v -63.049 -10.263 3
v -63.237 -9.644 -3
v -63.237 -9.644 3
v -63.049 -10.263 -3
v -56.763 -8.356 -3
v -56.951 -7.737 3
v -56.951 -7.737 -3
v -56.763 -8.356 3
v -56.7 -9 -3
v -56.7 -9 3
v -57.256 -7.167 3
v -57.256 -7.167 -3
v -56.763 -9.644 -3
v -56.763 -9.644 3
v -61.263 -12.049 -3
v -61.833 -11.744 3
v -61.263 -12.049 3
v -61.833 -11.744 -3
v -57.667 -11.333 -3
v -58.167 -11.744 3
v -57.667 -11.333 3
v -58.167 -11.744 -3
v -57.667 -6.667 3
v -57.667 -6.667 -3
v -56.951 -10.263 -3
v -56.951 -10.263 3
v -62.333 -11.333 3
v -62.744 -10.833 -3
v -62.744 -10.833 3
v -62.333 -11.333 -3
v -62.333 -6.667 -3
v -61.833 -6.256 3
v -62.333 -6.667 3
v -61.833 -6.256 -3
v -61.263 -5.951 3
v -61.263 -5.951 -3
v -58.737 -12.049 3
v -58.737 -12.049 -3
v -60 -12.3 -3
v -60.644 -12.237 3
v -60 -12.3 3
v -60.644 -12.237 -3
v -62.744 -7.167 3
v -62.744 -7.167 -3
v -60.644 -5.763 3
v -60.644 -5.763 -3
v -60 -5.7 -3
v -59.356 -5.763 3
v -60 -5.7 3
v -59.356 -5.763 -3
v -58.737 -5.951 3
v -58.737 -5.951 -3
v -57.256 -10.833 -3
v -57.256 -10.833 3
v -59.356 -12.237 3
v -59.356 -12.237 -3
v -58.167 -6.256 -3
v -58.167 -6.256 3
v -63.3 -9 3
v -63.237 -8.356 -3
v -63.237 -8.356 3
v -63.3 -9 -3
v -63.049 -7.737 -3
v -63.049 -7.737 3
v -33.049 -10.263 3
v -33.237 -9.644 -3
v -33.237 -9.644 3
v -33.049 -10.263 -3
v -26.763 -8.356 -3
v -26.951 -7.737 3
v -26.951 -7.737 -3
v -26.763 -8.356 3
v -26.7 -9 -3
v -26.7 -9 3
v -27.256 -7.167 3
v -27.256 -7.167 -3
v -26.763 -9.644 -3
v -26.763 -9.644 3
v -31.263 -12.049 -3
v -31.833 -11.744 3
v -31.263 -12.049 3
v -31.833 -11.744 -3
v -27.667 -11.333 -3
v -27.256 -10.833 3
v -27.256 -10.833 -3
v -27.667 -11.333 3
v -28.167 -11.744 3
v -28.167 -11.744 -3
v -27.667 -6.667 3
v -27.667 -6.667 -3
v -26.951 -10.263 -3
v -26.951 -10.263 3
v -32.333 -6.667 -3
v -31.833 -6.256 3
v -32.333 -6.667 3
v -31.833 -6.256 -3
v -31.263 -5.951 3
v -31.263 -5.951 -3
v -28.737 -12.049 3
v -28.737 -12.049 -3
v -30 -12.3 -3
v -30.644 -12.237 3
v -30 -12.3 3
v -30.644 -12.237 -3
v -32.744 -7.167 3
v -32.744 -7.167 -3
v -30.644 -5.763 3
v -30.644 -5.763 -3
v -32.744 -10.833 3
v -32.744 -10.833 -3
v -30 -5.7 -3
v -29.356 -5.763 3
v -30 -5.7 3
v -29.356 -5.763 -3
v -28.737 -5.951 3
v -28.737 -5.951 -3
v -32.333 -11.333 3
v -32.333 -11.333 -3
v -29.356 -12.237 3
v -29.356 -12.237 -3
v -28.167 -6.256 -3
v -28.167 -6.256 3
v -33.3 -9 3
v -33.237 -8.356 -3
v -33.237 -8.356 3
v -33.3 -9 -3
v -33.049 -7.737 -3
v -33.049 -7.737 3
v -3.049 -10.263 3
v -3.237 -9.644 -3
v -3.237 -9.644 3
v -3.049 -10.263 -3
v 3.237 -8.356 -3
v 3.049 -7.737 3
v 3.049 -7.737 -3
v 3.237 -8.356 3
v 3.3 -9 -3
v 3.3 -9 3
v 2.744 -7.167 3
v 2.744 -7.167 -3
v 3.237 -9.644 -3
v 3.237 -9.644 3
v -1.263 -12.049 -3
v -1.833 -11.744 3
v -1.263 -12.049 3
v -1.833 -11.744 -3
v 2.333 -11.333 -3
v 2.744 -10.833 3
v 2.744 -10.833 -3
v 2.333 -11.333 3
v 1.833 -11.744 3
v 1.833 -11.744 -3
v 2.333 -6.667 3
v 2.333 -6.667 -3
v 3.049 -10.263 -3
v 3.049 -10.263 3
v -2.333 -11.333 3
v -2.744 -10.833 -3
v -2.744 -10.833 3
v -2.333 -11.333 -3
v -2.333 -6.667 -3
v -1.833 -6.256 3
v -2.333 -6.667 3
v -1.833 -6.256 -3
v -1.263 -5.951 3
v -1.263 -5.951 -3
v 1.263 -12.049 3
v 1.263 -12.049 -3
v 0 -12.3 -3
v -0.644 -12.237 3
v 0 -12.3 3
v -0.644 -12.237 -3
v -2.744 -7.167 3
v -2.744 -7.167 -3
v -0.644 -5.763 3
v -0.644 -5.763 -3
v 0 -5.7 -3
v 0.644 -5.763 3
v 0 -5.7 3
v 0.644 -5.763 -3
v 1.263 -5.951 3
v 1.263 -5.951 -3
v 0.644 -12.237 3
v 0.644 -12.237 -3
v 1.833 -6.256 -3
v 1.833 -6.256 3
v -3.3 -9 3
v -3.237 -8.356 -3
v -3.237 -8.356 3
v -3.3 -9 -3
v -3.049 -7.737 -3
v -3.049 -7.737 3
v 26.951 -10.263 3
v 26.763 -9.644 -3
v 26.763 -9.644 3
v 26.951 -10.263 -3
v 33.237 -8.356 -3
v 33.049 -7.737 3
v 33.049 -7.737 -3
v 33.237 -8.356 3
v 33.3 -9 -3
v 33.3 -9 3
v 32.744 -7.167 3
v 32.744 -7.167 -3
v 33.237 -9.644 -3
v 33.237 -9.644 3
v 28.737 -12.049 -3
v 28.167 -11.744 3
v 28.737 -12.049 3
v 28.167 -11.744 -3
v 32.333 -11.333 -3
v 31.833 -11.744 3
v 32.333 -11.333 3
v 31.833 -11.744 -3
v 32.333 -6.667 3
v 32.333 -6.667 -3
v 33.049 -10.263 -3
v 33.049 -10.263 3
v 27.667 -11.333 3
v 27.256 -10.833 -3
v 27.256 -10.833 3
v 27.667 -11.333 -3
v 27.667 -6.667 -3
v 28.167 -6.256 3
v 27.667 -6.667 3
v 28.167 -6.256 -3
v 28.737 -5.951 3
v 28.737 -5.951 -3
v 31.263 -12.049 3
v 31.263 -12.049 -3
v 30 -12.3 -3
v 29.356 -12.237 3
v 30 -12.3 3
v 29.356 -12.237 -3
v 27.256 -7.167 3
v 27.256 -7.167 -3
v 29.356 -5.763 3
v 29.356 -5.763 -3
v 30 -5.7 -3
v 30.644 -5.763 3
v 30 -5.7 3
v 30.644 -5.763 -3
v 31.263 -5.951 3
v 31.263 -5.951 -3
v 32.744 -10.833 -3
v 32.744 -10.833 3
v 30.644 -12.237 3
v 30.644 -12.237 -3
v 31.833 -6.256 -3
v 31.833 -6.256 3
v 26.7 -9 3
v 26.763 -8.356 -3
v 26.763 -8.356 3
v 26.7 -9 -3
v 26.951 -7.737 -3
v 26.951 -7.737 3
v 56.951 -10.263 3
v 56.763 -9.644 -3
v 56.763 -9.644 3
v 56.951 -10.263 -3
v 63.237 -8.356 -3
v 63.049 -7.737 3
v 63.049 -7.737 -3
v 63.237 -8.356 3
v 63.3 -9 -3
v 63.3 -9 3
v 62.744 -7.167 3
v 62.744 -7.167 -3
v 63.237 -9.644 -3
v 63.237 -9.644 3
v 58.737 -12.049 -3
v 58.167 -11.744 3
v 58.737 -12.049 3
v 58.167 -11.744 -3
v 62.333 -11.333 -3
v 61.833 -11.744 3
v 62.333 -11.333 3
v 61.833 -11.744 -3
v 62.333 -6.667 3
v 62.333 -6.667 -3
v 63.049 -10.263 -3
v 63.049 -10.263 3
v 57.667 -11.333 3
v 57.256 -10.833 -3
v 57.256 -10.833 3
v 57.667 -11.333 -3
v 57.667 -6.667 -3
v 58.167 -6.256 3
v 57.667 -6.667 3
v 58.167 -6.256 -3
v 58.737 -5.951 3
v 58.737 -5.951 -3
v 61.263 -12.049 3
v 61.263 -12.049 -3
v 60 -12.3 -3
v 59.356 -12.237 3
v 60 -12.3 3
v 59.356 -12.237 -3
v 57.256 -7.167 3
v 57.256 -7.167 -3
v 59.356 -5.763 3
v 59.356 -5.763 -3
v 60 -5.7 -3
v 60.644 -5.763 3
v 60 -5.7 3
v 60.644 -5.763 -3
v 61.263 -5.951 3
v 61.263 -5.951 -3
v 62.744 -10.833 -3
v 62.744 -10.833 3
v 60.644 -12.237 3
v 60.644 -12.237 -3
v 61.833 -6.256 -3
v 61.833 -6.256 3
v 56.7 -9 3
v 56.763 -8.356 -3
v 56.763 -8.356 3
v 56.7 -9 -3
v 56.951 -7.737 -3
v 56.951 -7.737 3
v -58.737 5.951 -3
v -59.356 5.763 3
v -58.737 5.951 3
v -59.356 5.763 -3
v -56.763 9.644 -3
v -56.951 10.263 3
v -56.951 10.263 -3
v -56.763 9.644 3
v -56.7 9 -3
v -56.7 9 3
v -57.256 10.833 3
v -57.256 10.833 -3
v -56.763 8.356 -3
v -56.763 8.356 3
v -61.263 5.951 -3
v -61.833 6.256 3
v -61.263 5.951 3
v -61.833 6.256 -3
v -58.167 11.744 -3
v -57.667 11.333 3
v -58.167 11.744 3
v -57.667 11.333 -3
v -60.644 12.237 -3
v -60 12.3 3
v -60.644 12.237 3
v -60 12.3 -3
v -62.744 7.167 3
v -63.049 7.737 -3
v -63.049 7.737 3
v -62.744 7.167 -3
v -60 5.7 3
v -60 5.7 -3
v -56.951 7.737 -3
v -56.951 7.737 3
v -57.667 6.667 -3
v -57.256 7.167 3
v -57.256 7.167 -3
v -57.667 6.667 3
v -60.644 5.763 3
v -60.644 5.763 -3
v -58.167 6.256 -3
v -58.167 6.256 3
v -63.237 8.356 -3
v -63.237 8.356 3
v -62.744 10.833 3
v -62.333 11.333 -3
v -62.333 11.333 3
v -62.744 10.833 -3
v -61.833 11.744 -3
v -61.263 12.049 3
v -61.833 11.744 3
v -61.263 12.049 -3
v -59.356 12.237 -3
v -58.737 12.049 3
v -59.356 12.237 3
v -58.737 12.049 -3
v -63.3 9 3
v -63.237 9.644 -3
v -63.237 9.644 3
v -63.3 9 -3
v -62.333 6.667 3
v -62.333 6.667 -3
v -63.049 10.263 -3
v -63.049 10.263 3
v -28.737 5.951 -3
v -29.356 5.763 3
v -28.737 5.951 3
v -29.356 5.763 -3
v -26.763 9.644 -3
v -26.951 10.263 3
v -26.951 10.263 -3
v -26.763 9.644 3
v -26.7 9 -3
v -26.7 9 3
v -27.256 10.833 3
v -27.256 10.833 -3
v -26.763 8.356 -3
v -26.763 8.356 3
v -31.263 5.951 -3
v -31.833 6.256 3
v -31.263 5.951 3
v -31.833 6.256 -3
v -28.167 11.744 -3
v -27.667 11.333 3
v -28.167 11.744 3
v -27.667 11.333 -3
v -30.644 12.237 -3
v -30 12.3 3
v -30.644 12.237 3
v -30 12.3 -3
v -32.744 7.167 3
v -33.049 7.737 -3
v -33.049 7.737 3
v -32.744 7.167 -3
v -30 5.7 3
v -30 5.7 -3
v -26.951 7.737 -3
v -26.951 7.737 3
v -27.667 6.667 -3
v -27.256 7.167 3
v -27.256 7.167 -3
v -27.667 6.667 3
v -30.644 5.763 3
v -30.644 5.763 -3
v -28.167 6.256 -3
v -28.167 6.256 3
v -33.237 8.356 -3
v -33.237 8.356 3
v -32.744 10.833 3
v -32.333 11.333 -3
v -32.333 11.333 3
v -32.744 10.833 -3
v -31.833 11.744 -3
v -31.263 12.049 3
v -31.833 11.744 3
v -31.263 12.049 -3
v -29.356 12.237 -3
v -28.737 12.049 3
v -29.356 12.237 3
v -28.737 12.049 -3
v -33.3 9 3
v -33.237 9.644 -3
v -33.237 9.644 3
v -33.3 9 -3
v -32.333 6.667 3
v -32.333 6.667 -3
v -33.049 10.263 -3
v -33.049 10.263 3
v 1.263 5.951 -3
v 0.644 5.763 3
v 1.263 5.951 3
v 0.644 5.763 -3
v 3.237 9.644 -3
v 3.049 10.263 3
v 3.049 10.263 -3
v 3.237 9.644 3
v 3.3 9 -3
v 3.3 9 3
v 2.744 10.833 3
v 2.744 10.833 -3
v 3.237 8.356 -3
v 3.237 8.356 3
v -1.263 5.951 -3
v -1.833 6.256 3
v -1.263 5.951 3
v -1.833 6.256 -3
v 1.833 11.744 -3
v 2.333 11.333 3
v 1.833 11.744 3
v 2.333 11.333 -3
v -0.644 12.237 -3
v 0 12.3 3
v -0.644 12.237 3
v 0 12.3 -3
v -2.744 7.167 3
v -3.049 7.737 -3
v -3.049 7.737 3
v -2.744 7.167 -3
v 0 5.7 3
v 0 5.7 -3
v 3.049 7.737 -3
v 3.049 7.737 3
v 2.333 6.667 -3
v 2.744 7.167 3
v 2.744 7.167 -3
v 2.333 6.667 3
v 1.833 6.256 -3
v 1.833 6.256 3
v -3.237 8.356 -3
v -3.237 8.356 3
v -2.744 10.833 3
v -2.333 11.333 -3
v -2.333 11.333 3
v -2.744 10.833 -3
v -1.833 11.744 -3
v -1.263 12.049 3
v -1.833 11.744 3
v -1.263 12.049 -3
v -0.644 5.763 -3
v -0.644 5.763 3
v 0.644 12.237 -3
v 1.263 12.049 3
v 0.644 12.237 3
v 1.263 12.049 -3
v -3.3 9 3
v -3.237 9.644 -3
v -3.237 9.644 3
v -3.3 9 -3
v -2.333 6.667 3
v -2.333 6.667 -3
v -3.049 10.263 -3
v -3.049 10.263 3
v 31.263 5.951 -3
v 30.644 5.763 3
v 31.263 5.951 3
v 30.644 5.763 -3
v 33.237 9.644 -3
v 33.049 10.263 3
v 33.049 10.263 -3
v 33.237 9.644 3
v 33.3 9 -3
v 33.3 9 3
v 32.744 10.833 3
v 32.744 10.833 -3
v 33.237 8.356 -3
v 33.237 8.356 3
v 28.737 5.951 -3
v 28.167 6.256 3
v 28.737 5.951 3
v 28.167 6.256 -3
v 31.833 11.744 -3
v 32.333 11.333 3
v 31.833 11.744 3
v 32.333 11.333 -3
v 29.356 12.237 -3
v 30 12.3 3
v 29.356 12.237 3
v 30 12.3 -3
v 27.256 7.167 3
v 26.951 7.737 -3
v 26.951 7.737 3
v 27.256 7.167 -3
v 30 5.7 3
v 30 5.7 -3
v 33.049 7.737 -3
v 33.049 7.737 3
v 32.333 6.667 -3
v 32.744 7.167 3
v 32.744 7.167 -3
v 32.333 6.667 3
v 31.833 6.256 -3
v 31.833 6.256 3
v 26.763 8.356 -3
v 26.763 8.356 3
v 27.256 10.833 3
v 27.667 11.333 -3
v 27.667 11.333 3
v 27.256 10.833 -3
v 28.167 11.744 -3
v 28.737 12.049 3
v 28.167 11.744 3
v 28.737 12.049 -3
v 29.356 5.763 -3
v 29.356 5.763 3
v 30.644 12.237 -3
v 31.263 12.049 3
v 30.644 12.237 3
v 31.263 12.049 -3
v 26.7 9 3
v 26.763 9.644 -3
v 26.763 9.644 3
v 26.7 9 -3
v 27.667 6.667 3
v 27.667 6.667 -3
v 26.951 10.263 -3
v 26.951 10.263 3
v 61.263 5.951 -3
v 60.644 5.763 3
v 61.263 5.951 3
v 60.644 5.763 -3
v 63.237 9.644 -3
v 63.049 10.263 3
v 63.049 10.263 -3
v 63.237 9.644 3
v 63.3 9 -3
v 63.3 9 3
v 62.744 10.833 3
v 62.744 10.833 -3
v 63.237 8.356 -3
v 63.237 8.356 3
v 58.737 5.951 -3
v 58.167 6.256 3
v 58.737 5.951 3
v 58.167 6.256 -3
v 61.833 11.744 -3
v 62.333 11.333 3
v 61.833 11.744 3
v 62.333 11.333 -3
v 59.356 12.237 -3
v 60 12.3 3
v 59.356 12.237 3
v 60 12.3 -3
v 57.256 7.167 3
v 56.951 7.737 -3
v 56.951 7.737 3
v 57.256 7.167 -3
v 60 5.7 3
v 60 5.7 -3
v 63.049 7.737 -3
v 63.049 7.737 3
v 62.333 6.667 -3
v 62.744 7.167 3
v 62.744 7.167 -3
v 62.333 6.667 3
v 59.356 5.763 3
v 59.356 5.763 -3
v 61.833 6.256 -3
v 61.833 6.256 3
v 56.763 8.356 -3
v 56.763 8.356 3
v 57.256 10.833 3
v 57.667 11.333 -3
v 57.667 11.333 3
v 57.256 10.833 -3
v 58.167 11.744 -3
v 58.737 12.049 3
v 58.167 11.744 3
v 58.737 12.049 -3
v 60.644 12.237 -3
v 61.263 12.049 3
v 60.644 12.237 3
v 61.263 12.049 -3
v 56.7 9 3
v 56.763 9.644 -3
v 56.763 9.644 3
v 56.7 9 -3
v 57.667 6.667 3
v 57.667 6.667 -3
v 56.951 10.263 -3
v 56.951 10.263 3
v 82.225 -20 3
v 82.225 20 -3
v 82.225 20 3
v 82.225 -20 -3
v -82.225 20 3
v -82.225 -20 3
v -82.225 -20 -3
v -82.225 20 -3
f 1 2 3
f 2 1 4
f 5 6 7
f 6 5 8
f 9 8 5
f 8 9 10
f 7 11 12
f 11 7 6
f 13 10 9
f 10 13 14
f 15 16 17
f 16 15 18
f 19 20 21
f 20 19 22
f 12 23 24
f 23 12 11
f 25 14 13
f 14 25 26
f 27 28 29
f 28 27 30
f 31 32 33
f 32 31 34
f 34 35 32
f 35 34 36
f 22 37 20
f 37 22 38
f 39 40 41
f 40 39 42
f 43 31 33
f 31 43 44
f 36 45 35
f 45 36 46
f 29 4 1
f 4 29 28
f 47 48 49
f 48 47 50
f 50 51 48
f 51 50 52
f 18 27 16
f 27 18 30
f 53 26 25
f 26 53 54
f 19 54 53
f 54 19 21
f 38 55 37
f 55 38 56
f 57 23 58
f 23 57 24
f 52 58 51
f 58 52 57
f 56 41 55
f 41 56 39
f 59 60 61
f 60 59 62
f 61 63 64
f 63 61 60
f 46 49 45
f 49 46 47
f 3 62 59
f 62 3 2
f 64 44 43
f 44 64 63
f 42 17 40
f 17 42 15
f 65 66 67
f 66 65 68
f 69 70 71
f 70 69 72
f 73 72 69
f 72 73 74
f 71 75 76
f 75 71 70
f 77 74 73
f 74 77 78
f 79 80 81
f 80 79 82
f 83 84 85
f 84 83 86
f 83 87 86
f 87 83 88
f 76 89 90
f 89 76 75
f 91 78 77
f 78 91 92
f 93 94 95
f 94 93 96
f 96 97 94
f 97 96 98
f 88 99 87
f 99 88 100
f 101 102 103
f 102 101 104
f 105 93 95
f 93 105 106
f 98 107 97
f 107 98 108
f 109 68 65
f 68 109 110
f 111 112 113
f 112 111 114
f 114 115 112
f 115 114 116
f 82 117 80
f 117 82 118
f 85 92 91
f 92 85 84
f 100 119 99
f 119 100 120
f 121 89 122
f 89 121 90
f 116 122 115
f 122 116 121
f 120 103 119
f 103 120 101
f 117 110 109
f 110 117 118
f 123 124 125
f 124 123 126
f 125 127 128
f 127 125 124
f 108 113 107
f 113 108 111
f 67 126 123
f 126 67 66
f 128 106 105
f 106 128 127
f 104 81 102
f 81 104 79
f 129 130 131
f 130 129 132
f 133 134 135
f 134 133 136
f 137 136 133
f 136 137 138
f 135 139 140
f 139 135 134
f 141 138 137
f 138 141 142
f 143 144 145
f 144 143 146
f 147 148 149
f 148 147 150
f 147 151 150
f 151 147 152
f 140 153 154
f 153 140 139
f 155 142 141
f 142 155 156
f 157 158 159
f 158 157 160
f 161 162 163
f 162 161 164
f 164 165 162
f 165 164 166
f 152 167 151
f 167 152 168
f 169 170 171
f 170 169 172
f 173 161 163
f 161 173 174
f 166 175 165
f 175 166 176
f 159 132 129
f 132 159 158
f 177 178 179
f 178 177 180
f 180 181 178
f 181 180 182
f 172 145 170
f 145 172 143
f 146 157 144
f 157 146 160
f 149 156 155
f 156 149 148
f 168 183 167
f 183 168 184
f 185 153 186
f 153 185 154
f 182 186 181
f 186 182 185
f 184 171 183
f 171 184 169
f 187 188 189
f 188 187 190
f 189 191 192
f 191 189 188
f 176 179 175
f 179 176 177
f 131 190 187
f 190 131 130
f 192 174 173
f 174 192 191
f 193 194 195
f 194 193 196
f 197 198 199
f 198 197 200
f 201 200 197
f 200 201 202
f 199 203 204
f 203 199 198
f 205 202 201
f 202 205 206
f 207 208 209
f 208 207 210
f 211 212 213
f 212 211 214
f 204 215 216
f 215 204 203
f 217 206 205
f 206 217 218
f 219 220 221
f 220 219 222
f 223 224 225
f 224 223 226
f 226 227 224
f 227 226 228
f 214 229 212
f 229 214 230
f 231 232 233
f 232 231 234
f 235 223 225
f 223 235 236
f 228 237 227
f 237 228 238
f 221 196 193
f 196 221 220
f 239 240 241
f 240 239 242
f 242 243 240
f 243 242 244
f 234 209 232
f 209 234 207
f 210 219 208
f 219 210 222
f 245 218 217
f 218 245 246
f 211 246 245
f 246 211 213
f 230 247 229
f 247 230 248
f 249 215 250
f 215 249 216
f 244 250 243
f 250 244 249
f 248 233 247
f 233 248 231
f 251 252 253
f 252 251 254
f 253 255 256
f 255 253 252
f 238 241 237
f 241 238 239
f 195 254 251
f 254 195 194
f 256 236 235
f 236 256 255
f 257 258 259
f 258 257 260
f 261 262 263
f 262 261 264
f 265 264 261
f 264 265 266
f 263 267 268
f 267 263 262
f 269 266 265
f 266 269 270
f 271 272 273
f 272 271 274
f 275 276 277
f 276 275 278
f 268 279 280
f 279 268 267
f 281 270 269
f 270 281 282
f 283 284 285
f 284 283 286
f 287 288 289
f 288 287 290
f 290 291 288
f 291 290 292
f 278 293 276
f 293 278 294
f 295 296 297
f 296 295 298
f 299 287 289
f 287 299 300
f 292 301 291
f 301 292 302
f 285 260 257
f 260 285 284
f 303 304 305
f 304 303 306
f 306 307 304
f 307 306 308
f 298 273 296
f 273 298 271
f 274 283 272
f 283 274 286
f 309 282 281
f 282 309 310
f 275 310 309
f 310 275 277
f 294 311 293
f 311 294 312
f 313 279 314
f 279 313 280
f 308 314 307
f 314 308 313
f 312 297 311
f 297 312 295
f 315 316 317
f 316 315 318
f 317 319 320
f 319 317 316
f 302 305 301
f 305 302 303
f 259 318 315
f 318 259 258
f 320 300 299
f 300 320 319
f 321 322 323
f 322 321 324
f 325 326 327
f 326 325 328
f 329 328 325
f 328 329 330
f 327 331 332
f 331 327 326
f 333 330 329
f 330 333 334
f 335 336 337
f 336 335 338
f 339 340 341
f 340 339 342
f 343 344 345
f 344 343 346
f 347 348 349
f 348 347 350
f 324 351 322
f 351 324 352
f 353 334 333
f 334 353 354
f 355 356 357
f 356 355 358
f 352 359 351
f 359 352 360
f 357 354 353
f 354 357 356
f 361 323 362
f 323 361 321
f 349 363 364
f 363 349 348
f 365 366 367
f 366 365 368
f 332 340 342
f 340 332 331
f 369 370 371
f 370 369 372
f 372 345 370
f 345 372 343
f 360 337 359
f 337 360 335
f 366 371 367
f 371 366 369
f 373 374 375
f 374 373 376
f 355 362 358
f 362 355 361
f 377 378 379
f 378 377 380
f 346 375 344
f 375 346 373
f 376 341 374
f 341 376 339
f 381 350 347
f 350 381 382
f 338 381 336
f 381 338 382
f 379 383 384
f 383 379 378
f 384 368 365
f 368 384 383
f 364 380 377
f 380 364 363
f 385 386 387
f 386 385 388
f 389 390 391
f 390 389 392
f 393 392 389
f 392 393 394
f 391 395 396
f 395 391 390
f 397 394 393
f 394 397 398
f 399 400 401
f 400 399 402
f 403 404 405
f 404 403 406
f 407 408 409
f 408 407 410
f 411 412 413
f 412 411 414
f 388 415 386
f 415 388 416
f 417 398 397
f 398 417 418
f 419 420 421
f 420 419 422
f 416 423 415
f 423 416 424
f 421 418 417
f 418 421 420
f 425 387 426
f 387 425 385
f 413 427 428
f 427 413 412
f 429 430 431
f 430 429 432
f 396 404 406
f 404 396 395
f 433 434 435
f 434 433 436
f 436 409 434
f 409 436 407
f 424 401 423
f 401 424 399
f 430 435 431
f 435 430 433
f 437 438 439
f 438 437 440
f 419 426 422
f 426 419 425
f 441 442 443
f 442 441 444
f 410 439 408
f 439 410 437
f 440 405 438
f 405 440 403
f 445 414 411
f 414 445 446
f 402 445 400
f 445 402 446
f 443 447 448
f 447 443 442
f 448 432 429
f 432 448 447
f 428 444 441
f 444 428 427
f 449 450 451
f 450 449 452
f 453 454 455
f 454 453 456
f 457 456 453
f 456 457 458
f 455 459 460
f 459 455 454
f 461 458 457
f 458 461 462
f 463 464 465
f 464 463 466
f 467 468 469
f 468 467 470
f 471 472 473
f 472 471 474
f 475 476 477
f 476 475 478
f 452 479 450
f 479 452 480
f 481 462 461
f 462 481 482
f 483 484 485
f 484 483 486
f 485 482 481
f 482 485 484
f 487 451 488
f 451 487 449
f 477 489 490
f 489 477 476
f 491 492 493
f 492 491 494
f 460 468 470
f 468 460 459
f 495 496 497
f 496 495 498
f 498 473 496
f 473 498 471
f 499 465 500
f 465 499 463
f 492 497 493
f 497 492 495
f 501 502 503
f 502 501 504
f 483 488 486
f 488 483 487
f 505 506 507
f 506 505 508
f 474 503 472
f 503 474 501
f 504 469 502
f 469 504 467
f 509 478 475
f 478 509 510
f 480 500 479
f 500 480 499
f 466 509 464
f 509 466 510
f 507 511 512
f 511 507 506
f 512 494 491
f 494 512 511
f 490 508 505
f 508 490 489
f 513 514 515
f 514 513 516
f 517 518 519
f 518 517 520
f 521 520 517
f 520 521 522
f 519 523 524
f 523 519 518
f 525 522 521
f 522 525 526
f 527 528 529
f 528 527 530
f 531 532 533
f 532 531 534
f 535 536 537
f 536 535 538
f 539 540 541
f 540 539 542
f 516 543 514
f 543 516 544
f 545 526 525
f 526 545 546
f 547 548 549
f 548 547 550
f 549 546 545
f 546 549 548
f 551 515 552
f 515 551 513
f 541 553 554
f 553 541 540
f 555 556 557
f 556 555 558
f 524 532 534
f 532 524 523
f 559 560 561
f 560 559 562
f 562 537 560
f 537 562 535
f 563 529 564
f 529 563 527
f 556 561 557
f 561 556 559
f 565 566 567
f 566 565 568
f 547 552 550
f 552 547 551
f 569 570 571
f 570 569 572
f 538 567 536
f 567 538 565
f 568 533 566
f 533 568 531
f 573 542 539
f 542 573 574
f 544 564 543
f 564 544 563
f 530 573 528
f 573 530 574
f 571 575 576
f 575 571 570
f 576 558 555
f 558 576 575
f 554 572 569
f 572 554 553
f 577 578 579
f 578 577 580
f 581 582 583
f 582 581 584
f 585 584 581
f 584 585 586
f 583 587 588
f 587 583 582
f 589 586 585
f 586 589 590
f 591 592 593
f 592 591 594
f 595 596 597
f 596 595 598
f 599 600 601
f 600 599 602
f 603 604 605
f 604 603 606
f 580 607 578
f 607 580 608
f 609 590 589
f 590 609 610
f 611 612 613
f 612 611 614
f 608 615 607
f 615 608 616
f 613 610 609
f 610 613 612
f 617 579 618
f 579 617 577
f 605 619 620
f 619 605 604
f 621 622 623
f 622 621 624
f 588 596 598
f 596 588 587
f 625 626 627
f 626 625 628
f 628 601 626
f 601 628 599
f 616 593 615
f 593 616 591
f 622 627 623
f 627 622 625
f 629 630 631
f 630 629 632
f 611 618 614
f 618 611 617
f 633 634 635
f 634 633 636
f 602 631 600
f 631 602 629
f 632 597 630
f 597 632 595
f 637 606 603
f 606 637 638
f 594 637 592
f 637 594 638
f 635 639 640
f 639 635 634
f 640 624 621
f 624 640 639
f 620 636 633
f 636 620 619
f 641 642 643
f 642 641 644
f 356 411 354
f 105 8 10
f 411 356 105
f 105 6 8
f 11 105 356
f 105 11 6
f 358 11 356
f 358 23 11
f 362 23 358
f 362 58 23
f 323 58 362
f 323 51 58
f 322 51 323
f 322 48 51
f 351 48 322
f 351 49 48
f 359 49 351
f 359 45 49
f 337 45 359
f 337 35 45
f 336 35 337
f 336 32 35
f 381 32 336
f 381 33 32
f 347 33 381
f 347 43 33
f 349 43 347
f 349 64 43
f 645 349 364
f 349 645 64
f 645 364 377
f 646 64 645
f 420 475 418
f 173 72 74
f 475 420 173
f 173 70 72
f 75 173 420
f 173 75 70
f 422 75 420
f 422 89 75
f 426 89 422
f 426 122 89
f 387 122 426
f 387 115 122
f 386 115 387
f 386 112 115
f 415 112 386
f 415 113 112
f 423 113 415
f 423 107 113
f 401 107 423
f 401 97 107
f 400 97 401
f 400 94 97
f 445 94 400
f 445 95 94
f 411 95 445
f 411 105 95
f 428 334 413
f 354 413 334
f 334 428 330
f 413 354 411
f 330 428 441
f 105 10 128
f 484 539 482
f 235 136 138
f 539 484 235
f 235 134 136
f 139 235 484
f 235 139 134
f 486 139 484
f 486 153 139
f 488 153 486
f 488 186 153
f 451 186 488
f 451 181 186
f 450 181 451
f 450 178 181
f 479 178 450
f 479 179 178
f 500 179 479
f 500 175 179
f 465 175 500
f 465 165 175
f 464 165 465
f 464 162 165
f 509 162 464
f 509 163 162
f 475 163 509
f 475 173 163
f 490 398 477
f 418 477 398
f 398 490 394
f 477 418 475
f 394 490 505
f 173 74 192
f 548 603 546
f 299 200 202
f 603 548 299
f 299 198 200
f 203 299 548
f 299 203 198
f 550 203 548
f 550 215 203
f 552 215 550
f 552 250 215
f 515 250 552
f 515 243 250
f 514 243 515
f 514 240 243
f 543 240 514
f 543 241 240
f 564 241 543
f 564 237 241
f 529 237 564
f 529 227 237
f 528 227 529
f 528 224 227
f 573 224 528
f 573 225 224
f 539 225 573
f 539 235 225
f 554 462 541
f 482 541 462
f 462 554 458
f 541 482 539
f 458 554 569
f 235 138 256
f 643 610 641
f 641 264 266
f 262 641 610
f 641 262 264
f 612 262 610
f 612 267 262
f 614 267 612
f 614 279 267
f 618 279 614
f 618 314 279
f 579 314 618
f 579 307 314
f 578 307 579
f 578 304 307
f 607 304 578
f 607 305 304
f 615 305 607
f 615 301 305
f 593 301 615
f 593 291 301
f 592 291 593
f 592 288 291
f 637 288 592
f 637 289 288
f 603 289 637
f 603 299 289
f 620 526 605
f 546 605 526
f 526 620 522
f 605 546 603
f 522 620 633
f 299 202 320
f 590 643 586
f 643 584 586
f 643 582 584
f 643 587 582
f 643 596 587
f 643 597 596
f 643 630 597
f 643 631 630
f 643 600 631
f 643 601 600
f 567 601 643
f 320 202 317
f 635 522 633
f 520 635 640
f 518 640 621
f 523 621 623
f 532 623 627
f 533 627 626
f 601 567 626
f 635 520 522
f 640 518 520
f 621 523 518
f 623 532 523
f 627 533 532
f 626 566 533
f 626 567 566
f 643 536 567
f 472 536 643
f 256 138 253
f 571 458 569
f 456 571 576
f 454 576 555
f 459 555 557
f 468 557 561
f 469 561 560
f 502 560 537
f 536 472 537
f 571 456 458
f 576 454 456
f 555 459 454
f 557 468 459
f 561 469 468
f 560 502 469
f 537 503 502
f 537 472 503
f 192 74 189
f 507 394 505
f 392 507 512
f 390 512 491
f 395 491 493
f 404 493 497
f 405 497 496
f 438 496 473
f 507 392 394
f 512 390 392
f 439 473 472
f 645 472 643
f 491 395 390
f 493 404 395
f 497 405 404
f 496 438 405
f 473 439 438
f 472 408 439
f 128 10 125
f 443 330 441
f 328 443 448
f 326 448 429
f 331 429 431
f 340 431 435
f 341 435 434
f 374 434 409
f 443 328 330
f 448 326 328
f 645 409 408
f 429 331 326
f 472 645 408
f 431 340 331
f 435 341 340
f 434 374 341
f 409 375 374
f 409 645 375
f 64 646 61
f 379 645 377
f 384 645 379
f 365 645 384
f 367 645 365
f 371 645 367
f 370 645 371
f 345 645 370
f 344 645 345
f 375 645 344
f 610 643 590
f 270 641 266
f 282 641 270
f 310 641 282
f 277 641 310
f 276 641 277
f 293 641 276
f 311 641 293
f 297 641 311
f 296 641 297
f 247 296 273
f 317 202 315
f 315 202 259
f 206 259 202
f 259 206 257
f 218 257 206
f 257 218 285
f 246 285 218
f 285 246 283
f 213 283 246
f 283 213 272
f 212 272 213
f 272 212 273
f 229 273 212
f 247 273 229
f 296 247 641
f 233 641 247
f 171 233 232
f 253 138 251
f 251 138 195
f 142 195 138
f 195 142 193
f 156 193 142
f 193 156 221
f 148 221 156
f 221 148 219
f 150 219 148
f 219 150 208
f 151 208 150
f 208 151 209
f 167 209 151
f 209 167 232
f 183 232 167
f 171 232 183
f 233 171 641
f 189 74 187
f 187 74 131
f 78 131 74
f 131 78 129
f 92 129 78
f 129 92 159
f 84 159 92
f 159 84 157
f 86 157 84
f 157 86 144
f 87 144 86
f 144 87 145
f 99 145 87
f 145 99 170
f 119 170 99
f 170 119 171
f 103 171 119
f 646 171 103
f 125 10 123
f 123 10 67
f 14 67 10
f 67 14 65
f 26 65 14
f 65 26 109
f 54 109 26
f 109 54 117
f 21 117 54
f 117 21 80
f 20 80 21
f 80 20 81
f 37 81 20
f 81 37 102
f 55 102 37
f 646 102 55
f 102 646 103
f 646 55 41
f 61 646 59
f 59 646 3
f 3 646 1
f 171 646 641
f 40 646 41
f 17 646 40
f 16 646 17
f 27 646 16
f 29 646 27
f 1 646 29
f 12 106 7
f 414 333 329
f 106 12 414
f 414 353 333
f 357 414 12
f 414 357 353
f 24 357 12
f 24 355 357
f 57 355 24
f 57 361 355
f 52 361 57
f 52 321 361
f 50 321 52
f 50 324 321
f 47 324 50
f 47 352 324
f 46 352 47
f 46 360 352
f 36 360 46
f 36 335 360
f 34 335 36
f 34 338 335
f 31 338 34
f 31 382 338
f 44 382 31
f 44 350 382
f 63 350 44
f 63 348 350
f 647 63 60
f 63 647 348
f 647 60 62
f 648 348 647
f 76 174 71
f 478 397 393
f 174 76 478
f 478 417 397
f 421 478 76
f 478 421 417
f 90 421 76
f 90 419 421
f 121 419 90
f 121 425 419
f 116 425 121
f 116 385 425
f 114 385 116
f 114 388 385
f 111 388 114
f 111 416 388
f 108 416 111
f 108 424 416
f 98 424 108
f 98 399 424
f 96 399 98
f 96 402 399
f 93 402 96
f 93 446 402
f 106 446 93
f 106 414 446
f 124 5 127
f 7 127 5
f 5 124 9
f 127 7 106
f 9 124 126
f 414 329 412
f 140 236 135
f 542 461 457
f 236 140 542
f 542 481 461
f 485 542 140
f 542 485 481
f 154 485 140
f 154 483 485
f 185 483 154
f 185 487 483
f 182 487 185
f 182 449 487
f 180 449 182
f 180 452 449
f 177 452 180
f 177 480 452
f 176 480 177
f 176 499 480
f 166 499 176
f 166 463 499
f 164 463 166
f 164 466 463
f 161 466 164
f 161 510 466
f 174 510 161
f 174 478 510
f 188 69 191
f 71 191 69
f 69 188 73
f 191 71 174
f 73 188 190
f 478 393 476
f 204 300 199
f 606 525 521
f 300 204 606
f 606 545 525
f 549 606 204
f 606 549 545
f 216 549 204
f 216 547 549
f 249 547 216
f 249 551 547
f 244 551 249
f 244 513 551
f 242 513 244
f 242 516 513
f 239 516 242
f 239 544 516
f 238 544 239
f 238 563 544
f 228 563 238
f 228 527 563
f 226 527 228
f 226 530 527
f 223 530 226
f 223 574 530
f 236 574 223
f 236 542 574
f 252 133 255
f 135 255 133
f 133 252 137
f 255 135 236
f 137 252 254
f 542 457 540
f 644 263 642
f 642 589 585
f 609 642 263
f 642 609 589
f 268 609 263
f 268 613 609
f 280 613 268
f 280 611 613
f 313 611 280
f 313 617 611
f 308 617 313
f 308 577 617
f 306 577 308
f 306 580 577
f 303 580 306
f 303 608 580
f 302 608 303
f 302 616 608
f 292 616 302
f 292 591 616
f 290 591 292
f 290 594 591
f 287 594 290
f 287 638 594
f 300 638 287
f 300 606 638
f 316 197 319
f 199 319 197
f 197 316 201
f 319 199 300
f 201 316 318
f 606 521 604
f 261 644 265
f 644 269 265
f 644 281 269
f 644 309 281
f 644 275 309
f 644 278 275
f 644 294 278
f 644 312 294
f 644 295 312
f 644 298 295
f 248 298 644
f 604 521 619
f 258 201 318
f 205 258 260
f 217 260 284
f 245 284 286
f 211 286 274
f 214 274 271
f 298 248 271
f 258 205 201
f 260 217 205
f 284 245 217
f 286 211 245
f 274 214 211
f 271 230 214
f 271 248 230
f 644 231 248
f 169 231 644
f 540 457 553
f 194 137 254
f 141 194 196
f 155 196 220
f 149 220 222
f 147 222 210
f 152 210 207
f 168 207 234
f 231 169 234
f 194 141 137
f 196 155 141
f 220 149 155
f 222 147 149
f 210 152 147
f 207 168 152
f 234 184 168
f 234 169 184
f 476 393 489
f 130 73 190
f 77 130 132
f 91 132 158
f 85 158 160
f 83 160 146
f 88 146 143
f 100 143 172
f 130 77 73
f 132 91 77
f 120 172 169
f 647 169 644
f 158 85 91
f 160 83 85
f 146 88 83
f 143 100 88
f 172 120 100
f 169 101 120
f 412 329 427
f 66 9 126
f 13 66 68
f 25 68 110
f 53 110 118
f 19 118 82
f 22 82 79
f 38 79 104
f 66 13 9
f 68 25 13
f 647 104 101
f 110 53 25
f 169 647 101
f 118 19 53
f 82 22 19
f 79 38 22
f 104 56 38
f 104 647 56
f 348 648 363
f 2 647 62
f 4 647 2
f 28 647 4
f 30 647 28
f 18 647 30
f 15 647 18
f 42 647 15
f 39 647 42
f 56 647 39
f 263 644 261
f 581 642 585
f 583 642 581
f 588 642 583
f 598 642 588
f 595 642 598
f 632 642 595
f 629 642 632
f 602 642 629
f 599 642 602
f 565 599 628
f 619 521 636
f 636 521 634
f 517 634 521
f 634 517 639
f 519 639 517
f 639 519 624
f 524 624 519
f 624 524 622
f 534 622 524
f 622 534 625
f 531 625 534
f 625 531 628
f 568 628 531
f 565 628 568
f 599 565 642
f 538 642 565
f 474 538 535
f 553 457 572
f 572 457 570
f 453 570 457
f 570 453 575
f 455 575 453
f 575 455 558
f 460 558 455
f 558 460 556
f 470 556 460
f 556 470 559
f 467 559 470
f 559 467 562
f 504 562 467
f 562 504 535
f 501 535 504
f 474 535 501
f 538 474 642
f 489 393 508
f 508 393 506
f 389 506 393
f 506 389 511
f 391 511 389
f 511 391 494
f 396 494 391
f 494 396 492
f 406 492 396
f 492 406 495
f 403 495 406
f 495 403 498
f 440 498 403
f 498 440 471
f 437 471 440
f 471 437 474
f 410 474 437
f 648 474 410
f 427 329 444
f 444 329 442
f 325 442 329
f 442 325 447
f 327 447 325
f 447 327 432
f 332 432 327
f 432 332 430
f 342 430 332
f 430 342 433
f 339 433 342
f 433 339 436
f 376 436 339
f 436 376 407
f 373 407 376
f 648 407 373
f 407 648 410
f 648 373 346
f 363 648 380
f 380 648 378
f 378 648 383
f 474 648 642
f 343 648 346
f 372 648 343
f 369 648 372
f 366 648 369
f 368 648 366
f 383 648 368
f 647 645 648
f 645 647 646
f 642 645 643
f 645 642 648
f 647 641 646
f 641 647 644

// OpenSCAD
$fn = 32;

// ----------------------------------------------------------------------
// Hole bar, 5 x Ø6.6
// tworows layout, 22.225 mm edge offset
// ----------------------------------------------------------------------

// --- parameters (mm) ---
bar_w = 40;       // bar width (Y)
bar_t = 6;        // bar thickness (Z)
holes = 5;        // holes per row
hole_d = 6.6;     // hole diameter
edge = 22.225;    // offset from the bar end to the first hole
pitch = 30;       // pitch between neighbouring holes
row_offset = 18;  // distance between the two rows

// --- derived feature positions (mm) ---
span = (holes - 1) * pitch;   // = 120   distance between the end holes
bar_l = span + 2 * edge;      // = 164.45   overall bar length
start_x = -bar_l / 2 + edge;  // = -60   X of the first hole
feature_centers = [
  [start_x + 0 * pitch, -row_offset / 2],
  [start_x + 1 * pitch, -row_offset / 2],
  [start_x + 2 * pitch, -row_offset / 2],
  [start_x + 3 * pitch, -row_offset / 2],
  [start_x + 4 * pitch, -row_offset / 2]
];   // hole centres of the first row
row2_centers = [
  [start_x + 0 * pitch, row_offset / 2],
  [start_x + 1 * pitch, row_offset / 2],
  [start_x + 2 * pitch, row_offset / 2],
  [start_x + 3 * pitch, row_offset / 2],
  [start_x + 4 * pitch, row_offset / 2]
];   // hole centres of the second row

// bar with two rows of holes, both read from their own centre arrays
difference() {
  translate([-bar_l / 2, -bar_w / 2, -bar_t / 2]) cube([bar_l, bar_w, bar_t]);
  for (centre = feature_centers)
    translate([centre[0], centre[1], 0])
      cylinder(d = hole_d, h = bar_t + 2, center = true);
  for (centre = row2_centers)
    translate([centre[0], centre[1], 0])
      cylinder(d = hole_d, h = bar_t + 2, center = true);
}
